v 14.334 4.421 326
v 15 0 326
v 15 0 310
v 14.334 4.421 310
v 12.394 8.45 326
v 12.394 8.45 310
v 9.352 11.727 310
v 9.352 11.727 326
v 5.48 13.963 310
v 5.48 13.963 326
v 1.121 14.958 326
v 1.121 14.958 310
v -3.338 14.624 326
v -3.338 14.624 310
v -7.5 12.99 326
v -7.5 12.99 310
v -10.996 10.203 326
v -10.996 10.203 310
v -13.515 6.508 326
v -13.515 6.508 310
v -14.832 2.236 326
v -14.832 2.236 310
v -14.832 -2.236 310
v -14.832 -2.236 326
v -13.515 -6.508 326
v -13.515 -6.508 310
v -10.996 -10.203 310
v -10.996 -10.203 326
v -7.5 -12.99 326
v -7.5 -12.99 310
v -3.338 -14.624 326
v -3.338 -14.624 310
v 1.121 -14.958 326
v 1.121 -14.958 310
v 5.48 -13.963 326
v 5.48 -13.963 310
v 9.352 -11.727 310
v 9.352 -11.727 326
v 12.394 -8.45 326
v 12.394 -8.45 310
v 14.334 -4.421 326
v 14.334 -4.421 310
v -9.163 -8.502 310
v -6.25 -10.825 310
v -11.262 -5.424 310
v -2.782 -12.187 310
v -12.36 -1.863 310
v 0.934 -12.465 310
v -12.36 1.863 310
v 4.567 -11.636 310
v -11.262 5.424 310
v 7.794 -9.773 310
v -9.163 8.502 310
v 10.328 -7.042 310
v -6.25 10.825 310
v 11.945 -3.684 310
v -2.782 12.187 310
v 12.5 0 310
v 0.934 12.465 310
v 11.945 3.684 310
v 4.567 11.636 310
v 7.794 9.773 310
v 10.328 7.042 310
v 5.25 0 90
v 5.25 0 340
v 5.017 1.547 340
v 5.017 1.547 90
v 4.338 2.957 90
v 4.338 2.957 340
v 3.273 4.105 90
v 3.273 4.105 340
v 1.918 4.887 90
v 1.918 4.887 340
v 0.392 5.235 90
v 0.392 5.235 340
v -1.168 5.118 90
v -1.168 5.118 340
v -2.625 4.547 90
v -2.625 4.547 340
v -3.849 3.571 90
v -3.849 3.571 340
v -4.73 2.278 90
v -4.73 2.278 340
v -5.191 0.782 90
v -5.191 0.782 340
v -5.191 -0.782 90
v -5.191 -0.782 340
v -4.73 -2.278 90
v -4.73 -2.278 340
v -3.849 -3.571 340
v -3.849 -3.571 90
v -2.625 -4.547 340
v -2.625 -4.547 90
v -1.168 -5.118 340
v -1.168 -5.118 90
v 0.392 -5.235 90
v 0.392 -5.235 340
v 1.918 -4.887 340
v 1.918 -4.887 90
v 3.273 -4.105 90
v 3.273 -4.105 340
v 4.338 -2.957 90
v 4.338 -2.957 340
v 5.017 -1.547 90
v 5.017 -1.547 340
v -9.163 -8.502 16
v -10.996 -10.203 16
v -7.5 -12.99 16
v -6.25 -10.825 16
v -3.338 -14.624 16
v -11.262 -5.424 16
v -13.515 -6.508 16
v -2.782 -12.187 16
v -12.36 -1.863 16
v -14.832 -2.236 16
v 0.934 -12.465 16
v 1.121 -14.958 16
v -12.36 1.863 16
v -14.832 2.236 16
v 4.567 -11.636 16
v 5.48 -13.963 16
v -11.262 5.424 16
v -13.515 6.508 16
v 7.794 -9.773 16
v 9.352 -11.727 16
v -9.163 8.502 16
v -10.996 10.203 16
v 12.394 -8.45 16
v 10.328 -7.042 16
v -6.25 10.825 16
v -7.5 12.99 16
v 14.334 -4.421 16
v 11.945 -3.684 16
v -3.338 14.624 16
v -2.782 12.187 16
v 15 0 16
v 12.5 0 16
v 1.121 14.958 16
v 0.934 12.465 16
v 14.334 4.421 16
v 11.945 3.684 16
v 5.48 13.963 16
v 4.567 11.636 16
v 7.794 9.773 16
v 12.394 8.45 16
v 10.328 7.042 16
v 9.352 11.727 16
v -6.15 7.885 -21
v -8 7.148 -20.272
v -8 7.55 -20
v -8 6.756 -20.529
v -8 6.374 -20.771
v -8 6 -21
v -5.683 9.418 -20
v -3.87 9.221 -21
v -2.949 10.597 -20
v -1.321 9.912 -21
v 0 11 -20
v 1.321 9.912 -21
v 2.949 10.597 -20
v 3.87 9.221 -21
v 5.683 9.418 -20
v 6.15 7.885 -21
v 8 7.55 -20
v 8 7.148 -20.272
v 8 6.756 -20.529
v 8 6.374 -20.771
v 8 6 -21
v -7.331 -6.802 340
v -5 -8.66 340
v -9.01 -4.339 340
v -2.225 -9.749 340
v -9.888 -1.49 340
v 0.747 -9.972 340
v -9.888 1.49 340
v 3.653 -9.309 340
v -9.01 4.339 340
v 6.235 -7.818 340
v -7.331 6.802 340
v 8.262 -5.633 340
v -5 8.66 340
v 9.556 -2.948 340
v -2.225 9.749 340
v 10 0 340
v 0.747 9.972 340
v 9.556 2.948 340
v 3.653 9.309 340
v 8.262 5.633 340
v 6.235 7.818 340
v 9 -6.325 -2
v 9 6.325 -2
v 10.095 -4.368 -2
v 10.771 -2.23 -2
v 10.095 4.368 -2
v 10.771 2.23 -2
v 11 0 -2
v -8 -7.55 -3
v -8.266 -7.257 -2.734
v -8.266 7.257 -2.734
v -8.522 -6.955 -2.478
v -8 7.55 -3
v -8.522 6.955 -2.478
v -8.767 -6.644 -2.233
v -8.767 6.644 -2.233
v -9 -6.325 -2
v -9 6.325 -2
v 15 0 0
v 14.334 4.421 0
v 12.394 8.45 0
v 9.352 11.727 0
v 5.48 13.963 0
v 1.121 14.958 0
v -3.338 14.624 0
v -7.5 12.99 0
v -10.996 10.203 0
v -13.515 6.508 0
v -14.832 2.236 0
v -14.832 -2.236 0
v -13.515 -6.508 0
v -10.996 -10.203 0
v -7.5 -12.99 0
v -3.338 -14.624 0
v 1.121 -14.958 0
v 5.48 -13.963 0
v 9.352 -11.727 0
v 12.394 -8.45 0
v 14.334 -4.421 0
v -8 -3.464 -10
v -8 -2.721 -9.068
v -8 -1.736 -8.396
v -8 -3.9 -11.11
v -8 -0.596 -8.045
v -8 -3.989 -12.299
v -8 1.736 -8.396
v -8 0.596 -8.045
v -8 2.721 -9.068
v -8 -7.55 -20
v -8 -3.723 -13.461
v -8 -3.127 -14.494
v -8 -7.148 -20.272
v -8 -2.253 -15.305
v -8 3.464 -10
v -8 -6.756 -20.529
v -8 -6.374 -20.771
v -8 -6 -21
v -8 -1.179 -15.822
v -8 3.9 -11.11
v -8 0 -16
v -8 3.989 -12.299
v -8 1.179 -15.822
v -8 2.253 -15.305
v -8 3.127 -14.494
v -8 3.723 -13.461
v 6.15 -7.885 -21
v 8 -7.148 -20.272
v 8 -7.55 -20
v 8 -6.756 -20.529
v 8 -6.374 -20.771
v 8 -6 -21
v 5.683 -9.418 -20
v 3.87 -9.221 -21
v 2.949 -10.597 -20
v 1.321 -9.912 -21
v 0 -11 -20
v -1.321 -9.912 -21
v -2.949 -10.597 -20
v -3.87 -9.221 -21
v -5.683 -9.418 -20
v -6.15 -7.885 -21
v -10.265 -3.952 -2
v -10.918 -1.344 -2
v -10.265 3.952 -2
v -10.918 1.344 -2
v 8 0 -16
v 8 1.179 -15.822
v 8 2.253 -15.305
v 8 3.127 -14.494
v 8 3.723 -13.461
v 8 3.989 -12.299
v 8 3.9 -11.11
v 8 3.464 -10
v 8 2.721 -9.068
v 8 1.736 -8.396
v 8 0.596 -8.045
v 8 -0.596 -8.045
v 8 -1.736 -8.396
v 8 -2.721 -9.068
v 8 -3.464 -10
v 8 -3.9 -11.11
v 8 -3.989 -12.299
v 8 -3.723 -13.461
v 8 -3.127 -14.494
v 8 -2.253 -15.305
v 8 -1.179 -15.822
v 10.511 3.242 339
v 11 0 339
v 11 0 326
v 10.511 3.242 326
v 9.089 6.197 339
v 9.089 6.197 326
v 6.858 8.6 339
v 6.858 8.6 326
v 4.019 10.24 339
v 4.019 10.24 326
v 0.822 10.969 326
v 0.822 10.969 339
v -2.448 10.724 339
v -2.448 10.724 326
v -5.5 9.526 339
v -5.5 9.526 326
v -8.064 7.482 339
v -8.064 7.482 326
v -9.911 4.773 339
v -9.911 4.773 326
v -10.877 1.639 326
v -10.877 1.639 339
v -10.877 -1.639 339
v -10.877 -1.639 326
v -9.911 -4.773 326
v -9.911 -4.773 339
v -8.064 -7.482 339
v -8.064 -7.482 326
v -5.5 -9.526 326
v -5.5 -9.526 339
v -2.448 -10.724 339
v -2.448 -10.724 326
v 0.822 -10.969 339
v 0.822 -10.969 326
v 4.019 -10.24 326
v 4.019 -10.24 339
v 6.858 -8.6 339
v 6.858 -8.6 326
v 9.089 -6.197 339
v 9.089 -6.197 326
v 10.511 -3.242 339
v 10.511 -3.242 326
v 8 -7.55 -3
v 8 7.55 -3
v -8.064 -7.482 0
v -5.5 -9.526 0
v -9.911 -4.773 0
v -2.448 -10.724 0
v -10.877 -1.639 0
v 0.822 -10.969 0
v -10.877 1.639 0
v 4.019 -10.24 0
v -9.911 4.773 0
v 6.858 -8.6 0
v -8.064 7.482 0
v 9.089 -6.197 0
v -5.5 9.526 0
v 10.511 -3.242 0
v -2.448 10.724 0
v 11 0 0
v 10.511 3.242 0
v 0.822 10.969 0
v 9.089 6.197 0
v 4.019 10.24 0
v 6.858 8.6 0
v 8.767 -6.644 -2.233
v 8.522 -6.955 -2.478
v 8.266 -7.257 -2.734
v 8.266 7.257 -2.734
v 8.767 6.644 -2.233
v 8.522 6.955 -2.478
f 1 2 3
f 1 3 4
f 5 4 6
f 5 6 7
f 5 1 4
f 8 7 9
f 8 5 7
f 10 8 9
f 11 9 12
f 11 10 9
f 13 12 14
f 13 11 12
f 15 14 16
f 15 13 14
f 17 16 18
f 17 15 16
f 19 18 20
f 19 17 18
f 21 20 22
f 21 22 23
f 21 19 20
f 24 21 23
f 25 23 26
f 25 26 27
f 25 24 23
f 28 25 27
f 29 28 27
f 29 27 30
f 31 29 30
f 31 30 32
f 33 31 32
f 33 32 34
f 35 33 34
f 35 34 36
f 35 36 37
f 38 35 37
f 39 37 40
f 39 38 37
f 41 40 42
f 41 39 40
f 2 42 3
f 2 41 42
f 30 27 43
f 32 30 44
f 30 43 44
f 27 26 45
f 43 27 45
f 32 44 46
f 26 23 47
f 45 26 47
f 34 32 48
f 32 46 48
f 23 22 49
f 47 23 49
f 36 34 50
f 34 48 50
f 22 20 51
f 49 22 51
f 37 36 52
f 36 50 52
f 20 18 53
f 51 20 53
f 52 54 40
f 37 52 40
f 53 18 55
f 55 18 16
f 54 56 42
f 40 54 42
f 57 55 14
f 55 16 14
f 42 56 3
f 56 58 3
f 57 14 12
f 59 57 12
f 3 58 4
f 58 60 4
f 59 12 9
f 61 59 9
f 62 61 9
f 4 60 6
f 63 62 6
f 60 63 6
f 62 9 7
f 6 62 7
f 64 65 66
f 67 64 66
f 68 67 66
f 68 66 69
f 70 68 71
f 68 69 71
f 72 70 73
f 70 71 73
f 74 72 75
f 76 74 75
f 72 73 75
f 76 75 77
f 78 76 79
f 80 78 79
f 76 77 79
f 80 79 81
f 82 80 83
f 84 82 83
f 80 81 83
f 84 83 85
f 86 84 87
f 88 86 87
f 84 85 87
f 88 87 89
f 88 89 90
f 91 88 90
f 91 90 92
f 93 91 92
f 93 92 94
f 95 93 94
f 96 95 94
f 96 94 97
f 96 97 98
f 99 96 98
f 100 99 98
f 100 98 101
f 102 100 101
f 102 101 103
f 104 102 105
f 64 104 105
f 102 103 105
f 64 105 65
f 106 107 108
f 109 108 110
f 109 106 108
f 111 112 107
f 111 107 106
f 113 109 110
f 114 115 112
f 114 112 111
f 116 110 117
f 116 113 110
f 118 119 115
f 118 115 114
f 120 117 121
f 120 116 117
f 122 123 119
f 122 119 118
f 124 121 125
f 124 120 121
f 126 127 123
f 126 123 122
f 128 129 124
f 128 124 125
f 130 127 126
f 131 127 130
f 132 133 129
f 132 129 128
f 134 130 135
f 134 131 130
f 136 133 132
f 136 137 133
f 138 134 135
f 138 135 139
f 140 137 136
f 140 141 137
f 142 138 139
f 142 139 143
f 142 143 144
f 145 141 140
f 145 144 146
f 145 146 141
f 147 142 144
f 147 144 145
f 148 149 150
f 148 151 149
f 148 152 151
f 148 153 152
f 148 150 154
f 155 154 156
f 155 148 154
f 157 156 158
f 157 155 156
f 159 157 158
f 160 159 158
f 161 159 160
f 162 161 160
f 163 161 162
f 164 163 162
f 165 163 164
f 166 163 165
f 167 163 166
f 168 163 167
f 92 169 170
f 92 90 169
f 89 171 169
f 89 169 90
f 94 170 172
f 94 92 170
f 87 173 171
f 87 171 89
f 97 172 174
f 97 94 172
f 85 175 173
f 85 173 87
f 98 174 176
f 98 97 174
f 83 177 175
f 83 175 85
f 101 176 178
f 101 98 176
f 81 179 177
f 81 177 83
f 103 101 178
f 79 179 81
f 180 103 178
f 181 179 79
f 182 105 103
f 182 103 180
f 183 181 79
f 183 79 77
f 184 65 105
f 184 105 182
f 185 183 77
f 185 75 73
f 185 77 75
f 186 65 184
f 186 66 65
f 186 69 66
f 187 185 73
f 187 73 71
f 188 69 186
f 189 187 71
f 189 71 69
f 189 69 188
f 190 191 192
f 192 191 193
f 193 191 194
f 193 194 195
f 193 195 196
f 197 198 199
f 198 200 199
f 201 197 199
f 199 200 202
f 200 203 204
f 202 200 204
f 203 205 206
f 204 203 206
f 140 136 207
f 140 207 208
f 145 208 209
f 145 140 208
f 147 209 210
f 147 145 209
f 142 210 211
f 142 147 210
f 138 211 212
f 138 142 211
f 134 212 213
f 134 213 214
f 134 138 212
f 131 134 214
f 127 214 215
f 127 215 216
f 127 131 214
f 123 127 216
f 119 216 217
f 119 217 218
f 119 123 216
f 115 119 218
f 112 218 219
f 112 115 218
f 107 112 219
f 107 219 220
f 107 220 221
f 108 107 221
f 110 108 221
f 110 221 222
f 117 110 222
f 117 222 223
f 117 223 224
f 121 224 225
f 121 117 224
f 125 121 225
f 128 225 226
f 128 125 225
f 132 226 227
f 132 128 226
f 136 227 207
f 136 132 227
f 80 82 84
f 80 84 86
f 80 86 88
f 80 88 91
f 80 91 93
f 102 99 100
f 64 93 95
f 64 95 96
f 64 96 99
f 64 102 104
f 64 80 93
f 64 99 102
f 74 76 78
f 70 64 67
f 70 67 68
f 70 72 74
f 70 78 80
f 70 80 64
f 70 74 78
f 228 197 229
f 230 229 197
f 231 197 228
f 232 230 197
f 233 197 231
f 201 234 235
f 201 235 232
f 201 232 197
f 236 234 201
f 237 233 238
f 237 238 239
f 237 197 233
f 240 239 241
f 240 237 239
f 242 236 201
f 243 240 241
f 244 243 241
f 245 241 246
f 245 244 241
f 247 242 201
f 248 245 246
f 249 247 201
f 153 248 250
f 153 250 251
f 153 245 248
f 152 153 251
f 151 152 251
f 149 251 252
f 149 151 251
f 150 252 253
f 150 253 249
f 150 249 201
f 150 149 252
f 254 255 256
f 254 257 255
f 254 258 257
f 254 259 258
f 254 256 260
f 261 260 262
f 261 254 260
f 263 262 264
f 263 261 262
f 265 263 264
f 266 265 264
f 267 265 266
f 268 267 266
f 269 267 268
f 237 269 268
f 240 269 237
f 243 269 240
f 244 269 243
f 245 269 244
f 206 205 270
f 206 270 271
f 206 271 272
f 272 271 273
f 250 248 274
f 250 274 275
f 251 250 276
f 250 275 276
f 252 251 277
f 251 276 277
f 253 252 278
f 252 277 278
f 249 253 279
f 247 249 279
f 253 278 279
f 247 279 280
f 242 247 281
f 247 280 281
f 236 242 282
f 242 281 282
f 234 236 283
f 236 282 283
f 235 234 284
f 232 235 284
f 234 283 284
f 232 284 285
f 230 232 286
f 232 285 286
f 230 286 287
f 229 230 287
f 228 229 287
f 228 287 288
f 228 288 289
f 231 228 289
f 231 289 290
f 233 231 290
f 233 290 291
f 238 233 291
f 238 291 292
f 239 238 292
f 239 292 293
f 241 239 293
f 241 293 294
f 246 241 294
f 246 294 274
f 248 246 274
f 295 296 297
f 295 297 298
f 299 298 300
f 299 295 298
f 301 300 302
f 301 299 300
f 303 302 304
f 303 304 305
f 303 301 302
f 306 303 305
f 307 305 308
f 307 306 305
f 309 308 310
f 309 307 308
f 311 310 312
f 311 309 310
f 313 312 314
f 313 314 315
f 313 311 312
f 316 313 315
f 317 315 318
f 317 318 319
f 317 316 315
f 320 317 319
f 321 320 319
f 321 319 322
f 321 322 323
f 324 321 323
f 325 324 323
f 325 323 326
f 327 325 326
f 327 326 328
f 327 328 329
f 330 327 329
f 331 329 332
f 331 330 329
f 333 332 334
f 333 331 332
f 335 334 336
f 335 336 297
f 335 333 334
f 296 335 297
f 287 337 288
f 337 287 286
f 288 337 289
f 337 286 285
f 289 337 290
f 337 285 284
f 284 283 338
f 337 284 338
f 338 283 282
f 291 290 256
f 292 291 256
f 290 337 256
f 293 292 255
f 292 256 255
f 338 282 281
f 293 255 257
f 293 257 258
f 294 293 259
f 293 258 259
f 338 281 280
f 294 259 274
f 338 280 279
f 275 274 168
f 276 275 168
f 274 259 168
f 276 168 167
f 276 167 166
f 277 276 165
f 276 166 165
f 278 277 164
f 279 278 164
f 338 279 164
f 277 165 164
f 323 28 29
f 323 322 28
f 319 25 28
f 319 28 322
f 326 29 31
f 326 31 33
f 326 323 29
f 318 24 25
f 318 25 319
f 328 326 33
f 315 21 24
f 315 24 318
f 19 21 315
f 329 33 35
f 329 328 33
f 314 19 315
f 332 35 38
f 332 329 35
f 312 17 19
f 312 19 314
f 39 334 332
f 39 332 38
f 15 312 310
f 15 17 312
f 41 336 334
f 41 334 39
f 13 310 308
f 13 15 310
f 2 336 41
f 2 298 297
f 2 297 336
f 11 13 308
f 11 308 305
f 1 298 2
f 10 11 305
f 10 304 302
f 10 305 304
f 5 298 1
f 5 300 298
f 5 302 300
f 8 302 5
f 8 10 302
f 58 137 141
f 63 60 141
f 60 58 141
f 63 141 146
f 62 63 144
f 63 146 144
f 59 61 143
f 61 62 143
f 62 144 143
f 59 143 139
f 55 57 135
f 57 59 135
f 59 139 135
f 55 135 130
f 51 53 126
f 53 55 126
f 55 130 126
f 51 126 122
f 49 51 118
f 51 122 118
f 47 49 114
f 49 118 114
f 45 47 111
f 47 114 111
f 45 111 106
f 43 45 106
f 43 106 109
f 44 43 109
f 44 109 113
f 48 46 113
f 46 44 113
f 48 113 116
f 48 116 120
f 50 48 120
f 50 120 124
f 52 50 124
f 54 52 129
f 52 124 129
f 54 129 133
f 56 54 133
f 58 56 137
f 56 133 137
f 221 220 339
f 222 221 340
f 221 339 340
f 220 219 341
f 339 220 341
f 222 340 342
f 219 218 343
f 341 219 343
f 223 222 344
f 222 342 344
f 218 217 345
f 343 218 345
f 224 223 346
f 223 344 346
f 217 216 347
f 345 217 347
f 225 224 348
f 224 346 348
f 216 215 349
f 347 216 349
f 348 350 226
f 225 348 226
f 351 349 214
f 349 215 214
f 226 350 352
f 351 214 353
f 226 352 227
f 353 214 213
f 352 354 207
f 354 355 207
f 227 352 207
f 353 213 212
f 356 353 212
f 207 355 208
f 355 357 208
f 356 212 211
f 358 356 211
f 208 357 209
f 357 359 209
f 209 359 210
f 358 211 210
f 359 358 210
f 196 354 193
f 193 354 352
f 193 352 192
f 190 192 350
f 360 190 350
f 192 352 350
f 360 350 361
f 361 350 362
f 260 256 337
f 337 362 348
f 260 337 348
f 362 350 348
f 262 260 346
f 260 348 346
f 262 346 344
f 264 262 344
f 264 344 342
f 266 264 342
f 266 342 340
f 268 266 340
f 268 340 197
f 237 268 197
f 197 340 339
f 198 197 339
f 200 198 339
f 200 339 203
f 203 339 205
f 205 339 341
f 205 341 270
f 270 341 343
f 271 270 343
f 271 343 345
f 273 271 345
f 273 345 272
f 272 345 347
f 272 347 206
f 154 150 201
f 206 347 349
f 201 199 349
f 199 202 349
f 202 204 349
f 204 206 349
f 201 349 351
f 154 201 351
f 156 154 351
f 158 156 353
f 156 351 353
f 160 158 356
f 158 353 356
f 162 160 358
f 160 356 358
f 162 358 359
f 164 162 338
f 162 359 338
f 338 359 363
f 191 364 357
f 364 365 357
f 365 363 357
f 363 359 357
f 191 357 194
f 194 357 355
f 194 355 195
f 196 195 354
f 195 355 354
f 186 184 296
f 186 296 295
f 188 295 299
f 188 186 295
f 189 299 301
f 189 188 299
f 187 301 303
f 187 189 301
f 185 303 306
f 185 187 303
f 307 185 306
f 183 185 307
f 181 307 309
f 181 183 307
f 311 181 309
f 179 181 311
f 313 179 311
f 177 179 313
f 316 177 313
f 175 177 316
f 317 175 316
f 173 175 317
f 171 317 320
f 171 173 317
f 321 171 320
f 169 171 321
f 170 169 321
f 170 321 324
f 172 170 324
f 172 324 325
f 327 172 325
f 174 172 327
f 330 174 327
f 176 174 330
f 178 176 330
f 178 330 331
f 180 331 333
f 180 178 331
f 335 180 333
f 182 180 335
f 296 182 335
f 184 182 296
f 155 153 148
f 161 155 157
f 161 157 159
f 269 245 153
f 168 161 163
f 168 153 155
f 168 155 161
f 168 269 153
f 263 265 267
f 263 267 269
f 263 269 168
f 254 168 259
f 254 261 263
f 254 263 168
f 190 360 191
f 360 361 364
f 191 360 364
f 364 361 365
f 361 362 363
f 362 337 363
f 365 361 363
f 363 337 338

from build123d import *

# Parameters (mm, degrees)
ESQUISSE1_R             = 12.5
BOSS_EXTRU_1_DEPTH      = 326
ESQUISSE2_R             = 15
BOSS_EXTRU_2_DEPTH      = 16
BOSS_EXTRU_4_START      = -310
ESQUISSE2_2_R           = 15
BOSS_EXTRU_4_DEPTH      = 16
ESQUISSE3_R             = 11
BOSS_EXTRU_5_DEPTH      = 21
ESQUISSE4_W             = 5
ESQUISSE4_H             = 22
ENL_V_MAT_EXTRU_1_DEPTH = 19
ESQUISSE5_R             = 4
ENL_V_MAT_EXTRU_2_DEPTH = 328.1543978
BOSS_EXTRU_6_START      = 14
ESQUISSE6_R             = 11
BOSS_EXTRU_6_DEPTH      = 14
CHANFREIN1_SIZE         = 1
ESQUISSE7_R             = 5.25
ENL_V_MAT_EXTRU_3_DEPTH = 250


with BuildPart() as part:
    # Esquisse1 → Boss.-Extru.1 (new body)
    with BuildSketch(Plane.XY):
        Circle(ESQUISSE1_R)
    extrude(amount=BOSS_EXTRU_1_DEPTH)

    # Esquisse2 → Boss.-Extru.2 (add)
    with BuildSketch(Plane.XY.offset(326)):
        Circle(ESQUISSE2_R)
    extrude(amount=-BOSS_EXTRU_2_DEPTH)

    # Esquisse2<2> → Boss.-Extru.4 (add)
    with BuildSketch(Plane.XY.offset(326).offset(BOSS_EXTRU_4_START)):
        Circle(ESQUISSE2_2_R)
    extrude(amount=-BOSS_EXTRU_4_DEPTH)

    # Esquisse3 → Boss.-Extru.5 (add)
    with BuildSketch(Plane(origin=(0, 0, 0), x_dir=(-1, 0, 0), z_dir=(0, 0, -1))):
        Circle(ESQUISSE3_R)
    extrude(amount=BOSS_EXTRU_5_DEPTH)

    # Esquisse4 → Enlèv. mat.-Extru.1 (cut)
    with BuildSketch(Plane(origin=(0, 0, -21), x_dir=(-1, 0, 0), z_dir=(0, 0, -1))):
        with Locations((-10.5, 0)):
            Rectangle(ESQUISSE4_W, ESQUISSE4_H)
        with Locations((10.5, 0)):
            Rectangle(ESQUISSE4_W, ESQUISSE4_H)
    extrude(amount=-ENL_V_MAT_EXTRU_1_DEPTH, mode=Mode.SUBTRACT)

    # Esquisse5 → Enlèv. mat.-Extru.2 (cut, through all)
    with BuildSketch(Plane(origin=(8, 0, 0), x_dir=(0, 0, -1), z_dir=(1, 0, 0))):
        with Locations((12, 0)):
            Circle(ESQUISSE5_R)
    extrude(amount=-ENL_V_MAT_EXTRU_2_DEPTH, mode=Mode.SUBTRACT)

    # Esquisse6 → Boss.-Extru.6 (add)
    with BuildSketch(Plane.XY.offset(326).offset(BOSS_EXTRU_6_START)):
        Circle(ESQUISSE6_R)
    extrude(amount=-BOSS_EXTRU_6_DEPTH)

    # Chanfrein1
    chanfrein1_edges = [part.edges().sort_by_distance(p)[0] for p in [
        (-8, 0, -2),
        (8, 0, -2),
        (0, -11, -21),
        (0, 11, -21),
        (-11, 0, 340),
    ]]
    chamfer(chanfrein1_edges, length=CHANFREIN1_SIZE)

    # Esquisse7 → Enlèv. mat.-Extru.3 (cut)
    with BuildSketch(Plane.XY.offset(340)):
        Circle(ESQUISSE7_R)
    extrude(amount=-ENL_V_MAT_EXTRU_3_DEPTH, mode=Mode.SUBTRACT)


solid = part.part
